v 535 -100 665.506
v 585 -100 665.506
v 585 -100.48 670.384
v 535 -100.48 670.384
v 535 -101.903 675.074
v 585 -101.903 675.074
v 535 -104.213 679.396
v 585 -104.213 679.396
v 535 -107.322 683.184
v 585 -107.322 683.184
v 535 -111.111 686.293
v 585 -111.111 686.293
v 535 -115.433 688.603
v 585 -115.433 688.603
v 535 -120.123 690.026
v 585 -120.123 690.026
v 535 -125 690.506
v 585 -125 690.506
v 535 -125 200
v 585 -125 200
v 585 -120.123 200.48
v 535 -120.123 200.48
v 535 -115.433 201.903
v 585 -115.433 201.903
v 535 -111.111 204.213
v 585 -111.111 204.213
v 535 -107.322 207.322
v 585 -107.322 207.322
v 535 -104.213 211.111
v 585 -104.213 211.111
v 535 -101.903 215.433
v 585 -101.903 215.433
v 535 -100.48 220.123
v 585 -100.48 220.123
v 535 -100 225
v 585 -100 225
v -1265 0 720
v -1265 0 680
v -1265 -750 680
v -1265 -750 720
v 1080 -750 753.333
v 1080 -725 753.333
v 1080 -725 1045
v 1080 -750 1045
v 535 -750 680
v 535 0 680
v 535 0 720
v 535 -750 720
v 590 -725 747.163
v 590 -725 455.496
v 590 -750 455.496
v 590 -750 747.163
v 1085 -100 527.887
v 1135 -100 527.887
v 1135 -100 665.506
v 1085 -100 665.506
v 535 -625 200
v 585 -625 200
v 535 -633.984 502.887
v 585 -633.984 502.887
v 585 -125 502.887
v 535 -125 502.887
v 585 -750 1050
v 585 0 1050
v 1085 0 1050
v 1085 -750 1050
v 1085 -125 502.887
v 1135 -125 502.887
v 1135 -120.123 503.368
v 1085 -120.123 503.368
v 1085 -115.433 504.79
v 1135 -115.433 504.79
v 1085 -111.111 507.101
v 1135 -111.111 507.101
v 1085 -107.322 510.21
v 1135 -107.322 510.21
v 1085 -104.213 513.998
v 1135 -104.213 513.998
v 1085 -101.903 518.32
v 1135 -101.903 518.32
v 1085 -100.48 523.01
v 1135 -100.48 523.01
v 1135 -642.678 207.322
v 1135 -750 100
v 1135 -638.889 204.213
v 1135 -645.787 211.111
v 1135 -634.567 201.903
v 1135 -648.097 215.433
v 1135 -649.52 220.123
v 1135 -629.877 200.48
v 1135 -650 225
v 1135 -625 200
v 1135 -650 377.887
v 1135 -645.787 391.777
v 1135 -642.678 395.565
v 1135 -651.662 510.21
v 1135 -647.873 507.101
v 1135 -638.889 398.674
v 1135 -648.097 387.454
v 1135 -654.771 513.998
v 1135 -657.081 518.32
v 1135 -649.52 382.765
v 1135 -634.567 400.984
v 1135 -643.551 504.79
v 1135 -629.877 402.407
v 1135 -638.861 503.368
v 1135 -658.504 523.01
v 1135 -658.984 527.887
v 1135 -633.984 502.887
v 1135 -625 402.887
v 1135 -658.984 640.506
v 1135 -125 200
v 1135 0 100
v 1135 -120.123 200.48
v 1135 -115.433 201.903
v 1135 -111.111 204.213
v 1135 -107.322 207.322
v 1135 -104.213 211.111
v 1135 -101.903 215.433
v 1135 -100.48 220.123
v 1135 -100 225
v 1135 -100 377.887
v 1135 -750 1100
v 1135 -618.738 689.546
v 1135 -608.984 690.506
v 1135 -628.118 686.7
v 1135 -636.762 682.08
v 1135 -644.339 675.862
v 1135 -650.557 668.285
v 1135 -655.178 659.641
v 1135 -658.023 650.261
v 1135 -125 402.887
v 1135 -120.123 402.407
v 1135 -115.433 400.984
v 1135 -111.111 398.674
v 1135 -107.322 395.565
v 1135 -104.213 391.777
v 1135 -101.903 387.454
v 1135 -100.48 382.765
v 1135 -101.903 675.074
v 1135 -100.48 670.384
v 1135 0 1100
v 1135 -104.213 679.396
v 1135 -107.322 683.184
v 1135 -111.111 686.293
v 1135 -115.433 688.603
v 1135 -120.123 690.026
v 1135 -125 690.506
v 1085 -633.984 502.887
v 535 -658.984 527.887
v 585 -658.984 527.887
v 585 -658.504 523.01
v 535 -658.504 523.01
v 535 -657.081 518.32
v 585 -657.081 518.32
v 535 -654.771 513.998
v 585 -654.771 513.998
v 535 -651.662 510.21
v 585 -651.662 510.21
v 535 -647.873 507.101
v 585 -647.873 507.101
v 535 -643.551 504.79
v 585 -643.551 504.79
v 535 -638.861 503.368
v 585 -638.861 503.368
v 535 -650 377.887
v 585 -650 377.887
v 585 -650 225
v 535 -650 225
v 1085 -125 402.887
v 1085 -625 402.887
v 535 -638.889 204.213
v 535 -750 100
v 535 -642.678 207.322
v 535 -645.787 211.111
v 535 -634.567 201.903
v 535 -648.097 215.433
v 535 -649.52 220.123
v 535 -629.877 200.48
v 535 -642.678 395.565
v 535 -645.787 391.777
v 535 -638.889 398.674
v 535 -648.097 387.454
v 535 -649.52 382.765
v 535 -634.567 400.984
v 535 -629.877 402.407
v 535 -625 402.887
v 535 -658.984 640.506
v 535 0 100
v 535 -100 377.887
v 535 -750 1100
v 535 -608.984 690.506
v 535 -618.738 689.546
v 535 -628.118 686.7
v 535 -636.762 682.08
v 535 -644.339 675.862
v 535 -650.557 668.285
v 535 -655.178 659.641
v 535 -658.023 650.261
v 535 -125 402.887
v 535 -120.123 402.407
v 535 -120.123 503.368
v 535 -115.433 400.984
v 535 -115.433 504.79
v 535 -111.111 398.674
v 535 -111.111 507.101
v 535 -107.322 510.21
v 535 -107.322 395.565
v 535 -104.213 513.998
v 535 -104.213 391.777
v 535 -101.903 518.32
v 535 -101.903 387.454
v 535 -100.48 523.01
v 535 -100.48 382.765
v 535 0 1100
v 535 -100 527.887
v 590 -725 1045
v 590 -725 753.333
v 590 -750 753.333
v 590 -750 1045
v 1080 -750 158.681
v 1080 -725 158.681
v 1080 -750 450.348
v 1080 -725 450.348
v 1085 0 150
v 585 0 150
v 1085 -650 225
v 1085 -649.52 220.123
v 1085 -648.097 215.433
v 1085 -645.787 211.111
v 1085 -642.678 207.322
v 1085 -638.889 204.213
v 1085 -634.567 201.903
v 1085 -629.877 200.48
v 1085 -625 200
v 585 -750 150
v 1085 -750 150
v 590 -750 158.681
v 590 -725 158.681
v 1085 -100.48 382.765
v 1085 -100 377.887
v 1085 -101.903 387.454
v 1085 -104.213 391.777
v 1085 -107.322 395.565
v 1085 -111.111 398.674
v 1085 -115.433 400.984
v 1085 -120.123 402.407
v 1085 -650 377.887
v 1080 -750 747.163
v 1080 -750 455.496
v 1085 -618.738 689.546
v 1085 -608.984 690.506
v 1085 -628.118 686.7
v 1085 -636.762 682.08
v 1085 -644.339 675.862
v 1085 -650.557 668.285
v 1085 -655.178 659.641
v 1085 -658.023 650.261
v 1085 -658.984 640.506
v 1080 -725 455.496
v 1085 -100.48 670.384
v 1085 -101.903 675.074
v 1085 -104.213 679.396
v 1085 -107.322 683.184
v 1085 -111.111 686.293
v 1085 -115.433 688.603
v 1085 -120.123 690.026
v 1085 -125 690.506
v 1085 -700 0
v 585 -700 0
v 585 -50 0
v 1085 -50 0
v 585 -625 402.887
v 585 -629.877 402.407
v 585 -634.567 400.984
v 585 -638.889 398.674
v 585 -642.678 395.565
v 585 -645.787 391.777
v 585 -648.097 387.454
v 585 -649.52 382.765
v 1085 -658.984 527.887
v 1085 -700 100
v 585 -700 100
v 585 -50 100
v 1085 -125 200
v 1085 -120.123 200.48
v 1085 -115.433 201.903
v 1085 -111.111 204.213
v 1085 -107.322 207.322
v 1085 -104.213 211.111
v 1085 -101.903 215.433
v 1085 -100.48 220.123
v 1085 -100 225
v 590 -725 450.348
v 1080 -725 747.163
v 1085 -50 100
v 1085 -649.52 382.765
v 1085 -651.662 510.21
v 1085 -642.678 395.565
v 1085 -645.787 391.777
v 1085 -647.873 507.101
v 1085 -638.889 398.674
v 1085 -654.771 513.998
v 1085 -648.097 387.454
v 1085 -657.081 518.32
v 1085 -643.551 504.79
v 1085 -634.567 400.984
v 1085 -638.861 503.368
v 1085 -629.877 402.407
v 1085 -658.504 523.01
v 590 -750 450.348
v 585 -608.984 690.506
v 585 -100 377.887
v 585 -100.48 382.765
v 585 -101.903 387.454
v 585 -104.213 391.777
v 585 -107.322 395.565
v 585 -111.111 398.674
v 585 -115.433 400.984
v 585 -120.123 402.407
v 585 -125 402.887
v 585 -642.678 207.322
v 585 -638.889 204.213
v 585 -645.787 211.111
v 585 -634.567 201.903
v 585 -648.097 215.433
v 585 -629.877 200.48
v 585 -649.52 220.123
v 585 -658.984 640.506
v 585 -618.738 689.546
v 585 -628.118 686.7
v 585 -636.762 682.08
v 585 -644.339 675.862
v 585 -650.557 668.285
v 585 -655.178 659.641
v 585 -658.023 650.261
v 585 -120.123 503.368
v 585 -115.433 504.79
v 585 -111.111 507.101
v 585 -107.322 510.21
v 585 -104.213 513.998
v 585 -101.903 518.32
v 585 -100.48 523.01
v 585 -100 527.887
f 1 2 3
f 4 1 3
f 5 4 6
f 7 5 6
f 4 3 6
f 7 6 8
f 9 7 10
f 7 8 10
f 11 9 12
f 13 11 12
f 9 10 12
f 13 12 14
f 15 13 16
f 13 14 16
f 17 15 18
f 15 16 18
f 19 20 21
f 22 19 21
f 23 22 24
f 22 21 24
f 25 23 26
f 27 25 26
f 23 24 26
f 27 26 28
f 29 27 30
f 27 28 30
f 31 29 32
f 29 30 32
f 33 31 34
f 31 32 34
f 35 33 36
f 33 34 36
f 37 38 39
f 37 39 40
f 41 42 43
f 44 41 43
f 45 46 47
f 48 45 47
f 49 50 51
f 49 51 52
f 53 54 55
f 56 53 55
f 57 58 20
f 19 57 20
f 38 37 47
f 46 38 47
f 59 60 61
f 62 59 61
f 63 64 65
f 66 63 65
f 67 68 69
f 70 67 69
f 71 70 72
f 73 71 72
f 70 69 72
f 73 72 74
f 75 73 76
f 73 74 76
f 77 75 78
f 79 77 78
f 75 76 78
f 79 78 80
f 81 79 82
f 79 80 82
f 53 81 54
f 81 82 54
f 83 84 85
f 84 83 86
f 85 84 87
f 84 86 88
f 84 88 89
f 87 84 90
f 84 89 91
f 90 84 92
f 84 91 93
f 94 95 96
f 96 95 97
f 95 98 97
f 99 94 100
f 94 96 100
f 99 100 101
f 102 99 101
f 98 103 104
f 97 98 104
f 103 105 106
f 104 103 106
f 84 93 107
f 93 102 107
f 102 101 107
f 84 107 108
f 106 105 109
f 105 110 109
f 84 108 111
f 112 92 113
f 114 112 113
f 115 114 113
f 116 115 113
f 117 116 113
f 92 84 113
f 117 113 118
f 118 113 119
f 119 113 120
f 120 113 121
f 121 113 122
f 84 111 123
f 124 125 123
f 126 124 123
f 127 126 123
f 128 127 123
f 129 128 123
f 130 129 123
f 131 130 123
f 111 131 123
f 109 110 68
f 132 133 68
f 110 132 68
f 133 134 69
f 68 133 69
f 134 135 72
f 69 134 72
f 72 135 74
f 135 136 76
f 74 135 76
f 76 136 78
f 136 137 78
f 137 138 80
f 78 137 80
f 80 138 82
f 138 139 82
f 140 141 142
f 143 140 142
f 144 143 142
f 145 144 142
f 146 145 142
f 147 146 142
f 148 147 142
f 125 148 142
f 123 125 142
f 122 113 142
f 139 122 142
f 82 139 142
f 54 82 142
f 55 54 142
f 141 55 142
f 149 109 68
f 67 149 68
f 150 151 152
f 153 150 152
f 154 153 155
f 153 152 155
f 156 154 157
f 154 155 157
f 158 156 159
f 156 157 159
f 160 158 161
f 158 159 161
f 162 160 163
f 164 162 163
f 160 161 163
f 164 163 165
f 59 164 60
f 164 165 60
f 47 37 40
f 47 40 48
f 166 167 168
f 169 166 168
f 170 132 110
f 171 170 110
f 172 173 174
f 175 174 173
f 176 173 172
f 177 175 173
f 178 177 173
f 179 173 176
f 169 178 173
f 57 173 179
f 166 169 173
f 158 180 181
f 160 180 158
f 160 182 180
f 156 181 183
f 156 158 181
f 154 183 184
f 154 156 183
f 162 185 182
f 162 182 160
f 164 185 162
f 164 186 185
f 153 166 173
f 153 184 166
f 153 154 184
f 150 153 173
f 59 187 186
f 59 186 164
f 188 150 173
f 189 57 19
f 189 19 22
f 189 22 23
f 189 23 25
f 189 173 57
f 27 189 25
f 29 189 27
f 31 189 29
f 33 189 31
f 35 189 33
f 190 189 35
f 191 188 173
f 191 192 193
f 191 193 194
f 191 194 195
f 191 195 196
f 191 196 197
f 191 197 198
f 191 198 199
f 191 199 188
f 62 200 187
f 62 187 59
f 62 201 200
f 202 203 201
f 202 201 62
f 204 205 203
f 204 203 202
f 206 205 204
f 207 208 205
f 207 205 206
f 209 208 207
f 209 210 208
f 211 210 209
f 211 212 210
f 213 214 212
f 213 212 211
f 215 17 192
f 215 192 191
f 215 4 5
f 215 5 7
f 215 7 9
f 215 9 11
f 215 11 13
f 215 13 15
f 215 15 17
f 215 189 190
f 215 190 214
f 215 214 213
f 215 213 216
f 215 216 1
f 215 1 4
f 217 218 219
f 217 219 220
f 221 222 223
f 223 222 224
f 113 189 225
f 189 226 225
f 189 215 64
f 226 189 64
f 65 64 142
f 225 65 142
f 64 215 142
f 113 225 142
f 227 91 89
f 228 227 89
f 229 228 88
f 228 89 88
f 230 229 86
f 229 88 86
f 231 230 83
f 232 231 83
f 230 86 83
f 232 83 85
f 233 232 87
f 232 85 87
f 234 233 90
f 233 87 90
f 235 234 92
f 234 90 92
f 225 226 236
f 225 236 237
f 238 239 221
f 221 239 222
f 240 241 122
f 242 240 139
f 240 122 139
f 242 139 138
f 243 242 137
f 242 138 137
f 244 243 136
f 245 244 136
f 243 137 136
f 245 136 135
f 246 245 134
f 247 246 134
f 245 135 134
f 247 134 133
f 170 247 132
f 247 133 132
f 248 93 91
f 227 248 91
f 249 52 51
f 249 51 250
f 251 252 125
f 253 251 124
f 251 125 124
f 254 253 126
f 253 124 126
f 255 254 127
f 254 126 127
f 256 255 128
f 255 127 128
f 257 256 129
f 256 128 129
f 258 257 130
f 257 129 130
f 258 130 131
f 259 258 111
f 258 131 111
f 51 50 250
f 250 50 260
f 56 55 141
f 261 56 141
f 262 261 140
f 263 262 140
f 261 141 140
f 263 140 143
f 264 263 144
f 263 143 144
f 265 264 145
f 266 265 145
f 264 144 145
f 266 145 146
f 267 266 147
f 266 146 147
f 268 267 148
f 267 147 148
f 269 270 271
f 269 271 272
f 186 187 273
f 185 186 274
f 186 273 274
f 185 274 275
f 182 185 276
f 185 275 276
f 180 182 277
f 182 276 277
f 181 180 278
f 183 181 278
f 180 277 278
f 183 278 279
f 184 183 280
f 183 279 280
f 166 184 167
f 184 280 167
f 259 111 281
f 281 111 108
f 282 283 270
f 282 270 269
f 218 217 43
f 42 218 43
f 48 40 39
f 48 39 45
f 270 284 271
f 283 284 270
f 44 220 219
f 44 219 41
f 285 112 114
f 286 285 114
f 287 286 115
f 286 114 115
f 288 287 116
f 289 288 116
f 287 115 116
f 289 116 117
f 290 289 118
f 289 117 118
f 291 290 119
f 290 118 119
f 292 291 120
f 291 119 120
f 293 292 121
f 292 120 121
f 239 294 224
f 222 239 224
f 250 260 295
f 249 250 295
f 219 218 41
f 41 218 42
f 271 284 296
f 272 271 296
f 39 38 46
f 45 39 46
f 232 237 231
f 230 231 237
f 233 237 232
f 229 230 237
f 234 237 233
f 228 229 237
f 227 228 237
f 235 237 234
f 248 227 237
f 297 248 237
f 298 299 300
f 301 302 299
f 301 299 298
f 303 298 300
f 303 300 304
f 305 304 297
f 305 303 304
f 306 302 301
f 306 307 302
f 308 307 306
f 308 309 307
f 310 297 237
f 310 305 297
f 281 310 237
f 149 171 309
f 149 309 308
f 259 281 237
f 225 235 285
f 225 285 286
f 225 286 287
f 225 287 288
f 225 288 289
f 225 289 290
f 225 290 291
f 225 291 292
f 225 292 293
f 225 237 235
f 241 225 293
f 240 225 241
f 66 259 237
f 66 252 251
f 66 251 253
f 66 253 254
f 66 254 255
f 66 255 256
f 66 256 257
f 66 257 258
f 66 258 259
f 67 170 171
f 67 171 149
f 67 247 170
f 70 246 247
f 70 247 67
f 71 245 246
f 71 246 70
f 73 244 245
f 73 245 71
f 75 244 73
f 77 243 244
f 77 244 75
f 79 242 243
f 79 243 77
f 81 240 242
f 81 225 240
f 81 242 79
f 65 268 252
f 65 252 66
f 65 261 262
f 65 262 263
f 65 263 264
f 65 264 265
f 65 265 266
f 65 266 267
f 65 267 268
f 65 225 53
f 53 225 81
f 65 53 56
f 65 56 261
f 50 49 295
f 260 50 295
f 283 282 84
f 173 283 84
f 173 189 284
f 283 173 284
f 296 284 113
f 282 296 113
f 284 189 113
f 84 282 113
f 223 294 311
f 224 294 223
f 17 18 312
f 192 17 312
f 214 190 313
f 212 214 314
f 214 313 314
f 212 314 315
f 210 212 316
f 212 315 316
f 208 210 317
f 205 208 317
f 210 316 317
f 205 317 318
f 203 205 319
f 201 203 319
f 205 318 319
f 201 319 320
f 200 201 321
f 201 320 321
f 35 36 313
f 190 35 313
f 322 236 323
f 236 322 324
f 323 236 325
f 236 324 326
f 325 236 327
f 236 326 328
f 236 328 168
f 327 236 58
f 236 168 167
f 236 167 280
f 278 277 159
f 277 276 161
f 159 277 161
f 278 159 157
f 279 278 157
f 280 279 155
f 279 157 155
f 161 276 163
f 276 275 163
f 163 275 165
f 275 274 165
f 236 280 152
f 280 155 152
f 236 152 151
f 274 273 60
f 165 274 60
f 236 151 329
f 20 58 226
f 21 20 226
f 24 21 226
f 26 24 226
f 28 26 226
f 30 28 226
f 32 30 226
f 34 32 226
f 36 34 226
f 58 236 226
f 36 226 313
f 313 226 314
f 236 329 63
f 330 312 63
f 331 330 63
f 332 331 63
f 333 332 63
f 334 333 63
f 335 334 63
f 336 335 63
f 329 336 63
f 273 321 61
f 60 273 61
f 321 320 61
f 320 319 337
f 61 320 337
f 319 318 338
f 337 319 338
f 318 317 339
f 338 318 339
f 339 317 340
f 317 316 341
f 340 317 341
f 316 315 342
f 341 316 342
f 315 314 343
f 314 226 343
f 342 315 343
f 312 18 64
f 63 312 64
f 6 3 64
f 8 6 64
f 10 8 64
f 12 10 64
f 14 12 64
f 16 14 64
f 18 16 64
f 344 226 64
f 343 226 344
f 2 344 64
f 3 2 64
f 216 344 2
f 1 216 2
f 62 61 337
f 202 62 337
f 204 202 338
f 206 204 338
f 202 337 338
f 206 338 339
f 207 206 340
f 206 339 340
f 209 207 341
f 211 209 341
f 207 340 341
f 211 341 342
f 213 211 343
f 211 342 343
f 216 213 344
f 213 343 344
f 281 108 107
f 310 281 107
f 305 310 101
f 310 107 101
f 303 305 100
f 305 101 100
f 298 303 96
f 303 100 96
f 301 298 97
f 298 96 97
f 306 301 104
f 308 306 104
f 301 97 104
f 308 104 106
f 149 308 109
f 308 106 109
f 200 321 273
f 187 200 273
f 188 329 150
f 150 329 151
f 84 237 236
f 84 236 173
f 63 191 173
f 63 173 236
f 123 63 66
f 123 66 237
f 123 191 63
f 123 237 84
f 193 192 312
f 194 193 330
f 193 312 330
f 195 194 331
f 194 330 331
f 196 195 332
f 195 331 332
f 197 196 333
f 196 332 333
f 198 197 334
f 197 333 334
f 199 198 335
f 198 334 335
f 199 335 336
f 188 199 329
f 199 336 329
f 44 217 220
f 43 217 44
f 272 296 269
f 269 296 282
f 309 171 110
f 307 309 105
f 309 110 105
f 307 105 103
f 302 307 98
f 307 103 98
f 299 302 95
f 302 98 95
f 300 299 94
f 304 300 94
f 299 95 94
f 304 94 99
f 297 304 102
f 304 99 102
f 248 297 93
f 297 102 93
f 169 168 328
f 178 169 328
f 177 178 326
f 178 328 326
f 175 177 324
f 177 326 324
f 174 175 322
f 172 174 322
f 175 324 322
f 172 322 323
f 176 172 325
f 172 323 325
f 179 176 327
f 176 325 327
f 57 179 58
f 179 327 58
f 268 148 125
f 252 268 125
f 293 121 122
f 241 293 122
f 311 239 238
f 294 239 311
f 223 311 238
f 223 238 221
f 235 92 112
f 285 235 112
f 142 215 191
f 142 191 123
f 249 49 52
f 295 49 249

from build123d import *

# Parameters (mm, degrees)
F2_W      = 1800
F2_H      = 40
F4_DEPTH  = 750
F5_W      = 600
F5_H      = 1000
F6_DEPTH  = 750
F7_W      = 500
F7_H      = 900
F8_DEPTH  = 750.001
F10_DEPTH = 2400.001
F11_W     = 490
F11_H     = 291.6666666667
F12_DEPTH = 25
F15_W     = 500
F15_H     = 650
F16_DEPTH = 100


with BuildPart() as f4:
    # F2 (on face) → F4 (new body)
    with BuildSketch(Plane.XZ):
        with Locations((-365, 700)):
            Rectangle(F2_W, F2_H)
    extrude(amount=F4_DEPTH)


with BuildPart() as f6:
    # F5 (on face) → F6 (new body)
    with BuildSketch(Plane.XZ):
        with Locations((835, 500)):
            Rectangle(F5_W, F5_H)
    extrude(amount=F6_DEPTH)

    # F7 (on face) → F8 (cut, through all)
    with BuildSketch(Plane.XZ):
        with Locations((835, 500)):
            Rectangle(F7_W, F7_H)
    extrude(amount=F8_DEPTH, mode=Mode.SUBTRACT)

    # F9 (on face) → F10 (cut, through all)
    with BuildSketch(Plane.YZ.offset(1135)):
        with BuildLine():
            Line((-125, 590.5064177513), (-608.9838862419, 590.5064177513))
            ThreePointArc((-608.9838862419, 590.5064177513), (-644.3392253012, 575.8617568106), (-658.9838862419, 540.5064177513))
            Line((-658.9838862419, 540.5064177513), (-658.9838862419, 427.8873324394))
            ThreePointArc((-658.9838862419, 427.8873324394), (-651.6615557716, 410.2096629098), (-633.9838862419, 402.8873324394))
            Line((-633.9838862419, 402.8873324394), (-125, 402.8873324394))
            ThreePointArc((-125, 402.8873324394), (-107.3223304703, 410.2096629098), (-100, 427.8873324394))
            Line((-100, 427.8873324394), (-100, 565.5064177513))
            ThreePointArc((-100, 565.5064177513), (-107.3223304703, 583.184087281), (-125, 590.5064177513))
        make_face()
        with BuildLine():
            Line((-125, 302.8873324394), (-625, 302.8873324394))
            ThreePointArc((-625, 302.8873324394), (-642.6776695297, 295.5650019691), (-650, 277.8873324394))
            Line((-650, 277.8873324394), (-650, 125))
            ThreePointArc((-650, 125), (-642.6776695297, 107.3223304703), (-625, 100))
            Line((-625, 100), (-125, 100))
            ThreePointArc((-125, 100), (-107.3223304703, 107.3223304703), (-100, 125))
            Line((-100, 125), (-100, 277.8873324394))
            ThreePointArc((-100, 277.8873324394), (-107.3223304703, 295.5650019691), (-125, 302.8873324394))
        make_face()
    extrude(amount=-F10_DEPTH, mode=Mode.SUBTRACT)


with BuildPart() as f12:
    # F11 (on face) → F12 (new body)
    with BuildSketch(Plane.XZ):
        with Locations((835, 501.3296504815)):
            Rectangle(F11_W, F11_H)
    extrude(amount=F12_DEPTH)


with BuildPart() as f12b:
    # F11 (on face) → F12, piece 2 (new body)
    with BuildSketch(Plane.XZ):
        with Locations((835, 799.1666666667)):
            Rectangle(F11_W, F11_H)
    extrude(amount=F12_DEPTH)


with BuildPart() as f12c:
    # F11 (on face) → F12, piece 3 (new body)
    with BuildSketch(Plane.XZ):
        with Locations((835, 204.5144935449)):
            Rectangle(F11_W, F11_H)
    extrude(amount=F12_DEPTH)


with BuildPart() as f12b_1:
    # F13: moved
    add(f12b.part.moved(Location((0, -725, 0))))


with BuildPart() as f12_1:
    # F13: moved
    add(f12.part.moved(Location((0, -725, 0))))


with BuildPart() as f12c_1:
    # F13: moved
    add(f12c.part.moved(Location((0, -725, 0))))


with BuildPart() as f6_1:
    # F14: moved
    add(f6.part.moved(Location((0, 0, 100))))

    # F15 (on face) → F16 (join)
    with BuildSketch(Plane(origin=(0, 0, 100), x_dir=(1, 0, 0), z_dir=(0, 0, -1))):
        with Locations((835, 375)):
            Rectangle(F15_W, F15_H)
    extrude(amount=F16_DEPTH)


with BuildPart() as f12b_2:
    # F14: moved
    add(f12b_1.part.moved(Location((0, 0, 100))))


with BuildPart() as f12_2:
    # F14: moved
    add(f12_1.part.moved(Location((0, 0, 100))))


with BuildPart() as f12c_2:
    # F14: moved
    add(f12c_1.part.moved(Location((0, 0, 100))))


solid = Compound([f4.part, f6_1.part, f12b_2.part, f12_2.part, f12c_2.part])
